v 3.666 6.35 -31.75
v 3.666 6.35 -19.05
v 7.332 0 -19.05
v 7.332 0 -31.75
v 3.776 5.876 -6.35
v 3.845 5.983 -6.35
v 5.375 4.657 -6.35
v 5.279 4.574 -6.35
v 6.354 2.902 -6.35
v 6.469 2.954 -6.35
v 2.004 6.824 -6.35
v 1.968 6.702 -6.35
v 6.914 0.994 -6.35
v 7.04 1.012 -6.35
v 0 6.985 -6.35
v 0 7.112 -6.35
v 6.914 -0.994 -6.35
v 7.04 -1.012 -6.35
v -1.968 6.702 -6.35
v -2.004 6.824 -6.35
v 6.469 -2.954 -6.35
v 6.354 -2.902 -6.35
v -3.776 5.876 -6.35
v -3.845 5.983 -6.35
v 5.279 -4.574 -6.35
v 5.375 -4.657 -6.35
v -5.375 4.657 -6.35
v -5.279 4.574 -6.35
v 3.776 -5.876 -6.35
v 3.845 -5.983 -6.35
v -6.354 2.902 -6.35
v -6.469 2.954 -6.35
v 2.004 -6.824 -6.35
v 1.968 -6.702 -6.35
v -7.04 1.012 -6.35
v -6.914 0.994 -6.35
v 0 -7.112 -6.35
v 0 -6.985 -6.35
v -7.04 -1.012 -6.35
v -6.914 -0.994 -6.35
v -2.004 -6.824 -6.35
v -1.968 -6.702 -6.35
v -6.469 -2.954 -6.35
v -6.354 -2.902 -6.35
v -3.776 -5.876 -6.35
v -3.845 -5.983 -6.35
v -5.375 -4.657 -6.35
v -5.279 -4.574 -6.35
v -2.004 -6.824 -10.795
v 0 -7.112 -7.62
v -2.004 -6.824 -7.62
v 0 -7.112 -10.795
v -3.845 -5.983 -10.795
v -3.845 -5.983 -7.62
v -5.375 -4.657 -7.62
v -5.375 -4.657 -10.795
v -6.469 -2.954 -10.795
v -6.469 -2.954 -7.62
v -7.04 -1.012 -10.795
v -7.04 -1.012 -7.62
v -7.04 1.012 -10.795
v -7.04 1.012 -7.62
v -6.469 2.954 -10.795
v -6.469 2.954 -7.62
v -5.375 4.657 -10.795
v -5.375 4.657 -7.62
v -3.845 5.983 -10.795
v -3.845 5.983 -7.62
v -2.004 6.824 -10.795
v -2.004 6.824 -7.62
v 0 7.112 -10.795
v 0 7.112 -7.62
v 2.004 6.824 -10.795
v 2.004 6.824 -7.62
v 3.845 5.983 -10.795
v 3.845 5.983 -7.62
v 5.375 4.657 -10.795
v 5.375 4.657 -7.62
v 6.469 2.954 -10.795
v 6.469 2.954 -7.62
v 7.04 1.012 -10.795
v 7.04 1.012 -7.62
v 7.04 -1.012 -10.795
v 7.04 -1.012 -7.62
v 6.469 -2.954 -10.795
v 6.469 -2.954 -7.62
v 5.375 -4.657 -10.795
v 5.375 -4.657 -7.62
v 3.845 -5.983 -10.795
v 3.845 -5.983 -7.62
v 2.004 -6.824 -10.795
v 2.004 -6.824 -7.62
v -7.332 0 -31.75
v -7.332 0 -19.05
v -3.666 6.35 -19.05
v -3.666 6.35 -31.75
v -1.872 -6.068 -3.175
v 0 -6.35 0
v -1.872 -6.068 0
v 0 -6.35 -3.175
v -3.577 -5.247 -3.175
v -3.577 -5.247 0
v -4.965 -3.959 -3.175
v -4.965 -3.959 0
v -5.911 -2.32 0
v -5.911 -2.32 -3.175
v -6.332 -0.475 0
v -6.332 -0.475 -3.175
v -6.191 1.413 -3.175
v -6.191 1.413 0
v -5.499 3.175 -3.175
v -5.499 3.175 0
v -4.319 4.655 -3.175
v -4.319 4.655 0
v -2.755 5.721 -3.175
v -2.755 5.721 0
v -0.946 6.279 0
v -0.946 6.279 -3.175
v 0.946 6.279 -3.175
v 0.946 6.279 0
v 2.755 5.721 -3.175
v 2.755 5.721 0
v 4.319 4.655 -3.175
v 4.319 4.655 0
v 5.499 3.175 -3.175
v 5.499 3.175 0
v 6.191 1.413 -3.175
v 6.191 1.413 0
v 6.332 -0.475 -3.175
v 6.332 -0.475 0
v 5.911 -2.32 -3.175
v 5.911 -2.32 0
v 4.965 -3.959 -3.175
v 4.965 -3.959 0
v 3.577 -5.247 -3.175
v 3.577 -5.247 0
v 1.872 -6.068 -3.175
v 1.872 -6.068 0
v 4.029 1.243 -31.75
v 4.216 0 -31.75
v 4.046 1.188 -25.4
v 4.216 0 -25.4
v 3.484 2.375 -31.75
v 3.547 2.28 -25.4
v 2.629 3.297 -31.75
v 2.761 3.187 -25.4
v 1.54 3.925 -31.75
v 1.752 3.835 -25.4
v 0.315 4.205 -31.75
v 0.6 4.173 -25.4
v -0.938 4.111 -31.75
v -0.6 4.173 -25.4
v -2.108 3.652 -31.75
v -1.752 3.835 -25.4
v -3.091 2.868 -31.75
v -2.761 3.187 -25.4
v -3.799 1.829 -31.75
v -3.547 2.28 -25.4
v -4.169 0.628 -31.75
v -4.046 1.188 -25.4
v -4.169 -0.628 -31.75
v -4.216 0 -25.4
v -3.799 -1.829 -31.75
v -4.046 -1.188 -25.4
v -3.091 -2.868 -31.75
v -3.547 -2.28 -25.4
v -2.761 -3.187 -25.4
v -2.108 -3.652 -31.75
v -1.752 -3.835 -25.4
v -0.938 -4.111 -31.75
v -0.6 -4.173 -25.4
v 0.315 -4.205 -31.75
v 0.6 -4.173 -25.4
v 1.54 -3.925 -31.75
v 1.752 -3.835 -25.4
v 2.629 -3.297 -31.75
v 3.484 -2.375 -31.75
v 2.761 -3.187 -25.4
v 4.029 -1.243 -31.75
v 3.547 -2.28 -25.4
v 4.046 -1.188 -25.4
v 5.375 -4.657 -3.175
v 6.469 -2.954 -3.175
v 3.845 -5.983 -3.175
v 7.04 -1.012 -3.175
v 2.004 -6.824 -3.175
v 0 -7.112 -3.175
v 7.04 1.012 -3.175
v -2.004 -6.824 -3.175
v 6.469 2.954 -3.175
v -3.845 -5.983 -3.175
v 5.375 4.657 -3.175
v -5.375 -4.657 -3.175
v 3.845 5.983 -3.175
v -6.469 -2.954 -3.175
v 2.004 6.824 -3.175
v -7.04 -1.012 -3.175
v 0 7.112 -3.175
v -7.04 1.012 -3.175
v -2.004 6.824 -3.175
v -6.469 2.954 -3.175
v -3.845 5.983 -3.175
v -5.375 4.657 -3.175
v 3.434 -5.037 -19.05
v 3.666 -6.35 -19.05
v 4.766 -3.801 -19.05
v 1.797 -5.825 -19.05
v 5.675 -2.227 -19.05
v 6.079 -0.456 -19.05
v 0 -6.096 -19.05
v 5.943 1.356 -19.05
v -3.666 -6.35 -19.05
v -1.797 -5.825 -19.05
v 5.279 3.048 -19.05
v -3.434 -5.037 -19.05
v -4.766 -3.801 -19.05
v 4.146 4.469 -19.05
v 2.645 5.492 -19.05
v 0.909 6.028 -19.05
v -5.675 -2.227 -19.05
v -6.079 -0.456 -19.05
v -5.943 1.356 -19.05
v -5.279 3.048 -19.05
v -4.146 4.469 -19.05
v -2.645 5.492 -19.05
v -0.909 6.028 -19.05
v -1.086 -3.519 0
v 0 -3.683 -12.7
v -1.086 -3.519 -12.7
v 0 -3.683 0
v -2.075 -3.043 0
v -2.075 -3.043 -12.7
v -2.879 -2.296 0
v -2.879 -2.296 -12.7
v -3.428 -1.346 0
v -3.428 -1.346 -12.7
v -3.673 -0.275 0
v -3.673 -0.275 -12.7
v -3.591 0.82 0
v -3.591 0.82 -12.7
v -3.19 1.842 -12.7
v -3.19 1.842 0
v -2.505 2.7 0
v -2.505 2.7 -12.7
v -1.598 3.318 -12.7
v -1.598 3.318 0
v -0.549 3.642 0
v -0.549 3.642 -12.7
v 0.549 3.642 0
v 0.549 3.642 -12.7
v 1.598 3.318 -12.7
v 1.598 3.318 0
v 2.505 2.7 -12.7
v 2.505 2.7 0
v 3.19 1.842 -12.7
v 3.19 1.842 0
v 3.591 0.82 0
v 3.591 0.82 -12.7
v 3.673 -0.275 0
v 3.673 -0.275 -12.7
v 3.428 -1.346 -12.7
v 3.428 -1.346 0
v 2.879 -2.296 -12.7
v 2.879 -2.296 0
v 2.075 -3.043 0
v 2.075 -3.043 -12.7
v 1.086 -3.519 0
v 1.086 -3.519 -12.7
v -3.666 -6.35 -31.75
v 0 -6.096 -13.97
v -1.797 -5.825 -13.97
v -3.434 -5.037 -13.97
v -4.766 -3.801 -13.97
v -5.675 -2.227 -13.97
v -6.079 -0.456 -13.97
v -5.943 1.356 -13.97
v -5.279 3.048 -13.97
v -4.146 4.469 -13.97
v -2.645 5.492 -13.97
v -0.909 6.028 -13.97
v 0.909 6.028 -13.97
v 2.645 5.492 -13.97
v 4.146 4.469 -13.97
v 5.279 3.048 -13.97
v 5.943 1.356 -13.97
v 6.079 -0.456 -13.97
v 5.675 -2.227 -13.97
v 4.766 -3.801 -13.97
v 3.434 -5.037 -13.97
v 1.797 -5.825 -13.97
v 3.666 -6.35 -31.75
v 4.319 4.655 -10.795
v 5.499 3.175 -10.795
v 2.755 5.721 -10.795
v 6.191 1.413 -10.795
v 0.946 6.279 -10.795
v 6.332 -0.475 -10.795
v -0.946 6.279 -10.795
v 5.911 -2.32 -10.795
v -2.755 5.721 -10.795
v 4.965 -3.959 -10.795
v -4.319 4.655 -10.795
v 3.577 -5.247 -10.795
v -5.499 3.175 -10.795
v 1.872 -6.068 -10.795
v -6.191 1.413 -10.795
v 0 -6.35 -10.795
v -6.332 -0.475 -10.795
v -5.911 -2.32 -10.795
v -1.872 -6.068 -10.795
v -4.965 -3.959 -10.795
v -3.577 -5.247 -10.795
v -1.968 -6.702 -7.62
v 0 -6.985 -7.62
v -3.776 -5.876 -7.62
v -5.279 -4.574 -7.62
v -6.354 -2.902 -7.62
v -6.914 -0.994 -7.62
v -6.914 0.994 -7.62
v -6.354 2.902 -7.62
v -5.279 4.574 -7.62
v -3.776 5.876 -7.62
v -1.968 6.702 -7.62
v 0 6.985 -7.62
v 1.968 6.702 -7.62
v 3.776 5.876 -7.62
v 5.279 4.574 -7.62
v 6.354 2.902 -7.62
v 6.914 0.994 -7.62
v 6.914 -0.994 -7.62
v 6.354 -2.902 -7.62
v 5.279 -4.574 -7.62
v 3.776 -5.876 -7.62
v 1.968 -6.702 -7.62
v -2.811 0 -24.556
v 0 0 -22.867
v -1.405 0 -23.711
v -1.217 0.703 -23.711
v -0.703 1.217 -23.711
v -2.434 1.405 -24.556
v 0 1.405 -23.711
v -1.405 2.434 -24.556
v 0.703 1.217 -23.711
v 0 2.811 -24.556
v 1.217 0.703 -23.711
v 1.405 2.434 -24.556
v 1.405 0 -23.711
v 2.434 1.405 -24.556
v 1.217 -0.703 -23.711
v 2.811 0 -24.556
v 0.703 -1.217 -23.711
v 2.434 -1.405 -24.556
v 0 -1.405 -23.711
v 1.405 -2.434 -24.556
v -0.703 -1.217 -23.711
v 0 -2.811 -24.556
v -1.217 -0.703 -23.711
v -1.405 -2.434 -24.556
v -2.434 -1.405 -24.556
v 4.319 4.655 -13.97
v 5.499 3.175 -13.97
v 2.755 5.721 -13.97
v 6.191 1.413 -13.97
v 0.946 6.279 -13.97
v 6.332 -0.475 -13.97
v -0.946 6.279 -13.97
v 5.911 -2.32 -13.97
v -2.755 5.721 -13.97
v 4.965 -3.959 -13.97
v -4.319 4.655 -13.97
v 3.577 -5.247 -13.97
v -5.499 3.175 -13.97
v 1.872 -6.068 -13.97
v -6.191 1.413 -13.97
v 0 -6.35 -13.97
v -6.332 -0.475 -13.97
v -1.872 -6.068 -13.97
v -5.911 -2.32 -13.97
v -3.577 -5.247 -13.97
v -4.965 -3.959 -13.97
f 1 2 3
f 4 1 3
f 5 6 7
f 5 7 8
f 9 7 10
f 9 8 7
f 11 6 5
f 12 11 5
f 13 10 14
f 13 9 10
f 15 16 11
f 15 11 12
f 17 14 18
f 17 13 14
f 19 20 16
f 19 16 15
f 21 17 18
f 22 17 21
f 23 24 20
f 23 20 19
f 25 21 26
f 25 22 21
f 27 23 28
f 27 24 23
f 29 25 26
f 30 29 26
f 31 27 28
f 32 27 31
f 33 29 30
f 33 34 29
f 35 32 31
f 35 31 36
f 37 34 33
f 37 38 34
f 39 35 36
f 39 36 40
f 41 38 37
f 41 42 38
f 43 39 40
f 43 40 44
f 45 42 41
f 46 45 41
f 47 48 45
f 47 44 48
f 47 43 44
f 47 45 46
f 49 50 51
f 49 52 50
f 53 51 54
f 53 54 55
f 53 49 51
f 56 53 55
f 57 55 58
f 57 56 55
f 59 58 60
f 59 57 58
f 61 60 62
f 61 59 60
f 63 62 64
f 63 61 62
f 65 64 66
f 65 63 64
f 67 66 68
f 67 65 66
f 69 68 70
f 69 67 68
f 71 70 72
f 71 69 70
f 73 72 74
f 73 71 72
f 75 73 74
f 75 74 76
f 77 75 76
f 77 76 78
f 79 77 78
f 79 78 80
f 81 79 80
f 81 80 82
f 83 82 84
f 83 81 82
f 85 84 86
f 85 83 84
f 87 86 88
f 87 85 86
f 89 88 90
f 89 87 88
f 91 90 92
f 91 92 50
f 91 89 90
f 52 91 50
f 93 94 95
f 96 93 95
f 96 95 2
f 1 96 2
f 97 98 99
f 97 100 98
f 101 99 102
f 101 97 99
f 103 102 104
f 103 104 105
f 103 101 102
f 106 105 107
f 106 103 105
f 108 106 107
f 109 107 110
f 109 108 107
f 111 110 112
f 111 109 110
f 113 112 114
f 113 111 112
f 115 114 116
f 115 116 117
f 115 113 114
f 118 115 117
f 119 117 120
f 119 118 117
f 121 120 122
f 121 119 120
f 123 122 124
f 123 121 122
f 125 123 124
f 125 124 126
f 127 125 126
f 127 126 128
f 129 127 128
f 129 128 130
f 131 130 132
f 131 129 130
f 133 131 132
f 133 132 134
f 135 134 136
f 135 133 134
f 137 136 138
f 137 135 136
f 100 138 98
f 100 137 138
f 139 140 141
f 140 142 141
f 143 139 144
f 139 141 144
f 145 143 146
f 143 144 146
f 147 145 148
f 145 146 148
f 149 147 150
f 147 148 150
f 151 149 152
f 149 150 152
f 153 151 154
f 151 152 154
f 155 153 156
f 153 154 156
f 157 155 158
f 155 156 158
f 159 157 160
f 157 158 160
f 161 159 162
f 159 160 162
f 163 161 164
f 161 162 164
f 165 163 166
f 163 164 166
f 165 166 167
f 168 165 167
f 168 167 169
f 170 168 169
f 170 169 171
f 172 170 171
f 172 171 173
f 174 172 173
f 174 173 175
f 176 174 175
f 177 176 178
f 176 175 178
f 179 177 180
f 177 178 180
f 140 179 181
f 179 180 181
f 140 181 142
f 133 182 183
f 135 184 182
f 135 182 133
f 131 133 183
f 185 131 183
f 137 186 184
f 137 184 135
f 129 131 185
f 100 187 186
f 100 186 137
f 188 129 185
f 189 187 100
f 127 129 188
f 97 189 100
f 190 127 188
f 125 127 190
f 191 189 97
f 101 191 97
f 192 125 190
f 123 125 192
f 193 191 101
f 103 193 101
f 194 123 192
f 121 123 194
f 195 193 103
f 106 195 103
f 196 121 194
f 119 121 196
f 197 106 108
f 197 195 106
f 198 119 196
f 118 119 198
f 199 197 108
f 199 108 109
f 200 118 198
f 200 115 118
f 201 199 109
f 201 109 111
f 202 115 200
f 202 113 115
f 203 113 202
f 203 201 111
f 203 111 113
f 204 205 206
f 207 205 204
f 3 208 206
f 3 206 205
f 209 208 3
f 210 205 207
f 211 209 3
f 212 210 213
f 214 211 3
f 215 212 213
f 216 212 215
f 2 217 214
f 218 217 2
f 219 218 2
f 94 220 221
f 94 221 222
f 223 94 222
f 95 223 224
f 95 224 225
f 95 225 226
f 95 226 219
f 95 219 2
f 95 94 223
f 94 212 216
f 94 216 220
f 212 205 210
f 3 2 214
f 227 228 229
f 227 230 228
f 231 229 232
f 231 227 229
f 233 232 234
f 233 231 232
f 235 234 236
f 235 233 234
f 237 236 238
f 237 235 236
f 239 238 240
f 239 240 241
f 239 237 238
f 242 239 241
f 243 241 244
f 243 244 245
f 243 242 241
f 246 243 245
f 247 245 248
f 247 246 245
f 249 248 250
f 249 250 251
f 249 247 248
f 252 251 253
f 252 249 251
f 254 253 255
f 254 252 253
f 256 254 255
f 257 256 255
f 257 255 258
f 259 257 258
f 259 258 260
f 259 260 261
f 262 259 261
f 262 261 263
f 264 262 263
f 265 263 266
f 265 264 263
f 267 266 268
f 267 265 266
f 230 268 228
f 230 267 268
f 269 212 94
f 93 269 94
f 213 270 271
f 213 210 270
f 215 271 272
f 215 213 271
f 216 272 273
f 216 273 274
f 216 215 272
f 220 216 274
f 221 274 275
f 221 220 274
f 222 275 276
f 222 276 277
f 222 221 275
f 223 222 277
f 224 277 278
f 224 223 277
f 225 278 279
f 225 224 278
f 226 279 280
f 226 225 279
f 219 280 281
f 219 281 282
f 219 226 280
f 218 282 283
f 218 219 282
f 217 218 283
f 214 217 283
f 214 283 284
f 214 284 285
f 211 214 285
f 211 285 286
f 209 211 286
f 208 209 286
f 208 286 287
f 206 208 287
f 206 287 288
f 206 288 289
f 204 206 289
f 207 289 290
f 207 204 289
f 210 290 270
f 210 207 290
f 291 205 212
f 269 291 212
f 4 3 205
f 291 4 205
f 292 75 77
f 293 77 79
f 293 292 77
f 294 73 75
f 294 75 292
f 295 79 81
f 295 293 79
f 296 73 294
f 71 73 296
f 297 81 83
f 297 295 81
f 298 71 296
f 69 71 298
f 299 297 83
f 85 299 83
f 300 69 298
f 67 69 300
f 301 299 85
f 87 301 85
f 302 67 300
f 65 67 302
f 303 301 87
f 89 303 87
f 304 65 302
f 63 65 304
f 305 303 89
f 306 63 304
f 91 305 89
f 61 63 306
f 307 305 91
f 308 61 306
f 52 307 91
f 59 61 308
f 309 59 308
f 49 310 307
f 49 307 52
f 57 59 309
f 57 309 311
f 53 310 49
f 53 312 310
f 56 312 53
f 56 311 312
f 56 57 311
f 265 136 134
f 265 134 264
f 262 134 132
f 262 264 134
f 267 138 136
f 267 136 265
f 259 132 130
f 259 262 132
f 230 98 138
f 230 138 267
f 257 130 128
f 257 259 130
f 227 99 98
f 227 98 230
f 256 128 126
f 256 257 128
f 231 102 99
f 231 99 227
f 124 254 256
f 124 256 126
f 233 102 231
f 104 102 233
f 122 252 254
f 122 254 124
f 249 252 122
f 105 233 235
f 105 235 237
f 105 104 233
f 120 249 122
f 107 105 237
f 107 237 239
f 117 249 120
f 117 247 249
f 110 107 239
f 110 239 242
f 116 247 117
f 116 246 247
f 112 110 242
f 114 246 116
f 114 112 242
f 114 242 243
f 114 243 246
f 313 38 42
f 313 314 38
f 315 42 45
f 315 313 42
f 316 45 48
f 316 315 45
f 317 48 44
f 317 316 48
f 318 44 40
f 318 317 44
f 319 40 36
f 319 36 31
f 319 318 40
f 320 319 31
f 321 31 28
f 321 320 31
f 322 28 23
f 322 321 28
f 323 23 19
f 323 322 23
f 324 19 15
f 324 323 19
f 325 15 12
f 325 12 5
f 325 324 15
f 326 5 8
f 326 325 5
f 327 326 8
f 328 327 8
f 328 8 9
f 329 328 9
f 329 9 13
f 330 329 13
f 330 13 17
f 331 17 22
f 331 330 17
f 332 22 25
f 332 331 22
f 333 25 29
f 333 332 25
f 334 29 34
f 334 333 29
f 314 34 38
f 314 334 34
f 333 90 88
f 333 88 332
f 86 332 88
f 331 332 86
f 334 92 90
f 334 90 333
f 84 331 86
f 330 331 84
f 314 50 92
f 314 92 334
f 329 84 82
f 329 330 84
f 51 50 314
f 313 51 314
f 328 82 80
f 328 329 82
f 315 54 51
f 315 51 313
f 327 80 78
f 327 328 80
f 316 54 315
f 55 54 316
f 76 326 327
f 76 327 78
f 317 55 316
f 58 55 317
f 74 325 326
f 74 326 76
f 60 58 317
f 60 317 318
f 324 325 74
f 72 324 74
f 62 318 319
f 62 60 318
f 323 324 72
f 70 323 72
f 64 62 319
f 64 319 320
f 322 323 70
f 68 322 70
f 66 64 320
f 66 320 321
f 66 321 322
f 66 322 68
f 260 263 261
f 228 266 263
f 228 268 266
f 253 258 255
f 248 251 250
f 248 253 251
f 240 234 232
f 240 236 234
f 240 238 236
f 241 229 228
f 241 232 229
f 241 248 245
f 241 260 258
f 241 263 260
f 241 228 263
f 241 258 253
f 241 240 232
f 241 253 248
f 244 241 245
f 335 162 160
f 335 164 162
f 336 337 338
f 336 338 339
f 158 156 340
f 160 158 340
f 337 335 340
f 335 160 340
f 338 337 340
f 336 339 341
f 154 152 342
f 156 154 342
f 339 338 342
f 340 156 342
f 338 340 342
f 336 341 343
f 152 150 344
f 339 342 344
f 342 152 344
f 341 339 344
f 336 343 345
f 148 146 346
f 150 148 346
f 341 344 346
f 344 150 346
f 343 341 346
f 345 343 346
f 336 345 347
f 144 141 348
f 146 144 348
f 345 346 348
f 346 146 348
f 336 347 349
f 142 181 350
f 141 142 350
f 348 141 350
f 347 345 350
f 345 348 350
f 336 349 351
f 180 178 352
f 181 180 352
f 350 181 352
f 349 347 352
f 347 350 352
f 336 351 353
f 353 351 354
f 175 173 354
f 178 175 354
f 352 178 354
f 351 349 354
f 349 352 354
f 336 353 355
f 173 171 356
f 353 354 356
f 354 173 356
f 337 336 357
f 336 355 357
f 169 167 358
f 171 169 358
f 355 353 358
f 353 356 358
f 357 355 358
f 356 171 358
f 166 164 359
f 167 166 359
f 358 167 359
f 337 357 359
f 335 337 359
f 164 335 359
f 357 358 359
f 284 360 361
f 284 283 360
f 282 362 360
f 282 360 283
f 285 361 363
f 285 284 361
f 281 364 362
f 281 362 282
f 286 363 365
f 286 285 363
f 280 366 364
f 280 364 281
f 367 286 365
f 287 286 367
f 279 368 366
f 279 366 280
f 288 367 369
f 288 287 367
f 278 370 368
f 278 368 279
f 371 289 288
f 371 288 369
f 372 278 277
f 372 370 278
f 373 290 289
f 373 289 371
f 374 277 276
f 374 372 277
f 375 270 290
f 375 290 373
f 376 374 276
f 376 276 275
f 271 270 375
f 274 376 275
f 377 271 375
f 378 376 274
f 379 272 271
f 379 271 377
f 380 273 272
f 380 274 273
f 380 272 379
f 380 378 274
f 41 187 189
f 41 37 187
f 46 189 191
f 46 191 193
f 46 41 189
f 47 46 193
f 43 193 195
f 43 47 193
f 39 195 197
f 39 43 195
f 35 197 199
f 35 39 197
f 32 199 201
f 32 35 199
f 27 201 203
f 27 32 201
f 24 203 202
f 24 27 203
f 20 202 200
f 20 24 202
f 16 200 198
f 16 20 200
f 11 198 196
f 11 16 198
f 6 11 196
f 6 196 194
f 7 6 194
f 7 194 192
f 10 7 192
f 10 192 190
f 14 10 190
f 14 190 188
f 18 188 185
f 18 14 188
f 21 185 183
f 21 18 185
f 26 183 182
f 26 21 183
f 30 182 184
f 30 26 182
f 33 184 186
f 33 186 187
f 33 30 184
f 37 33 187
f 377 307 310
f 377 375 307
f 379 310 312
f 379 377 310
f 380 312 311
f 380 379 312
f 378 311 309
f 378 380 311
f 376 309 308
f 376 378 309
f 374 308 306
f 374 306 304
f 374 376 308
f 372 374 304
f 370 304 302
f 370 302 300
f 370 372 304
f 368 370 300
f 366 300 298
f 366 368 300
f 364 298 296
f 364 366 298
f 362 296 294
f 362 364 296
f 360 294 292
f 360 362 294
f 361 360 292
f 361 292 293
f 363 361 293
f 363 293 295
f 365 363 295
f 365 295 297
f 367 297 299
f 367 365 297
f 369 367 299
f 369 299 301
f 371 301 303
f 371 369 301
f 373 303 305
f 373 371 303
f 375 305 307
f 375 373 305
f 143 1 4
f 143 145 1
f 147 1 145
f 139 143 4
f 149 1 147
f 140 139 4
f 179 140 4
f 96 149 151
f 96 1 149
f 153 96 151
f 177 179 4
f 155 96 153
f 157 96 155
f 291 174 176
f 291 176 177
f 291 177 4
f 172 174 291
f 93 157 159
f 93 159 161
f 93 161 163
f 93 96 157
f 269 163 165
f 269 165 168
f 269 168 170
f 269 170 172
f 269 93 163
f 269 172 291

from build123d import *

# Parameters (mm, degrees)
SKETCH2_R                         = 31.732831761
CUT_EXTRUDE1_DEPTH                = 32.254845925
PIPE_TAP_DRILL_FOR_1_8_TAP1_D     = 8.4328
PIPE_TAP_DRILL_FOR_1_8_TAP1_DEPTH = 6.35
PIPE_TAP_DRILL_FOR_1_8_TAP1_TIP   = 2.533468714


with BuildPart() as part:
    # Sketch1 → Revolve1 (revolve)
    with BuildSketch(Plane(origin=(0, 0, 0), x_dir=(0, 0, -1), z_dir=(1, 0, 0)), mode=Mode.PRIVATE) as revolve1_sk:
        Polygon((3.175, 6.35), (3.175, 7.112), (6.35, 7.112), (6.35, 6.985), (7.62, 6.985), (7.62, 7.112), (10.795, 7.112), (10.795, 6.35), (13.97, 6.35), (13.97, 6.096), (19.05, 6.096), (19.05, 17.520886019), (31.75, 17.520886019), (31.75, 0), (12.7, 0), (12.7, 3.683), (0, 3.683), (0, 6.35), align=None)
    revolve(revolve1_sk.sketch.rotate(Axis((0, 0, -12.7), (0, 0, -1)), 180), axis=Axis((0, 0, -12.7), (0, 0, -1)))

    # Sketch2 → Cut-Extrude1 (cut, through all)
    with BuildSketch(Plane(origin=(0, 0, -19.05), x_dir=(-1, 0, 0), z_dir=(0, 0, -1))):
        Circle(SKETCH2_R)
        Polygon((7.332348419, 0), (3.666174209, 6.35), (-3.666174209, 6.35), (-7.332348419, 0), (-3.666174209, -6.35), (3.666174209, -6.35), align=None, mode=Mode.SUBTRACT)
    extrude(amount=CUT_EXTRUDE1_DEPTH, mode=Mode.SUBTRACT)

    # Pipe Tap Drill for 1/8 Tap1
    with Locations(Plane(origin=(0, 0, -31.75), x_dir=(-1, 0, 0), z_dir=(0, 0, -1))):
        with Locations((0, 0)):
            Hole(PIPE_TAP_DRILL_FOR_1_8_TAP1_D / 2, depth=PIPE_TAP_DRILL_FOR_1_8_TAP1_DEPTH)
            with Locations((0, 0, -(PIPE_TAP_DRILL_FOR_1_8_TAP1_DEPTH + PIPE_TAP_DRILL_FOR_1_8_TAP1_TIP / 2))):  # 118° drill point
                Cone(0, PIPE_TAP_DRILL_FOR_1_8_TAP1_D / 2, PIPE_TAP_DRILL_FOR_1_8_TAP1_TIP, mode=Mode.SUBTRACT)


solid = part.part
